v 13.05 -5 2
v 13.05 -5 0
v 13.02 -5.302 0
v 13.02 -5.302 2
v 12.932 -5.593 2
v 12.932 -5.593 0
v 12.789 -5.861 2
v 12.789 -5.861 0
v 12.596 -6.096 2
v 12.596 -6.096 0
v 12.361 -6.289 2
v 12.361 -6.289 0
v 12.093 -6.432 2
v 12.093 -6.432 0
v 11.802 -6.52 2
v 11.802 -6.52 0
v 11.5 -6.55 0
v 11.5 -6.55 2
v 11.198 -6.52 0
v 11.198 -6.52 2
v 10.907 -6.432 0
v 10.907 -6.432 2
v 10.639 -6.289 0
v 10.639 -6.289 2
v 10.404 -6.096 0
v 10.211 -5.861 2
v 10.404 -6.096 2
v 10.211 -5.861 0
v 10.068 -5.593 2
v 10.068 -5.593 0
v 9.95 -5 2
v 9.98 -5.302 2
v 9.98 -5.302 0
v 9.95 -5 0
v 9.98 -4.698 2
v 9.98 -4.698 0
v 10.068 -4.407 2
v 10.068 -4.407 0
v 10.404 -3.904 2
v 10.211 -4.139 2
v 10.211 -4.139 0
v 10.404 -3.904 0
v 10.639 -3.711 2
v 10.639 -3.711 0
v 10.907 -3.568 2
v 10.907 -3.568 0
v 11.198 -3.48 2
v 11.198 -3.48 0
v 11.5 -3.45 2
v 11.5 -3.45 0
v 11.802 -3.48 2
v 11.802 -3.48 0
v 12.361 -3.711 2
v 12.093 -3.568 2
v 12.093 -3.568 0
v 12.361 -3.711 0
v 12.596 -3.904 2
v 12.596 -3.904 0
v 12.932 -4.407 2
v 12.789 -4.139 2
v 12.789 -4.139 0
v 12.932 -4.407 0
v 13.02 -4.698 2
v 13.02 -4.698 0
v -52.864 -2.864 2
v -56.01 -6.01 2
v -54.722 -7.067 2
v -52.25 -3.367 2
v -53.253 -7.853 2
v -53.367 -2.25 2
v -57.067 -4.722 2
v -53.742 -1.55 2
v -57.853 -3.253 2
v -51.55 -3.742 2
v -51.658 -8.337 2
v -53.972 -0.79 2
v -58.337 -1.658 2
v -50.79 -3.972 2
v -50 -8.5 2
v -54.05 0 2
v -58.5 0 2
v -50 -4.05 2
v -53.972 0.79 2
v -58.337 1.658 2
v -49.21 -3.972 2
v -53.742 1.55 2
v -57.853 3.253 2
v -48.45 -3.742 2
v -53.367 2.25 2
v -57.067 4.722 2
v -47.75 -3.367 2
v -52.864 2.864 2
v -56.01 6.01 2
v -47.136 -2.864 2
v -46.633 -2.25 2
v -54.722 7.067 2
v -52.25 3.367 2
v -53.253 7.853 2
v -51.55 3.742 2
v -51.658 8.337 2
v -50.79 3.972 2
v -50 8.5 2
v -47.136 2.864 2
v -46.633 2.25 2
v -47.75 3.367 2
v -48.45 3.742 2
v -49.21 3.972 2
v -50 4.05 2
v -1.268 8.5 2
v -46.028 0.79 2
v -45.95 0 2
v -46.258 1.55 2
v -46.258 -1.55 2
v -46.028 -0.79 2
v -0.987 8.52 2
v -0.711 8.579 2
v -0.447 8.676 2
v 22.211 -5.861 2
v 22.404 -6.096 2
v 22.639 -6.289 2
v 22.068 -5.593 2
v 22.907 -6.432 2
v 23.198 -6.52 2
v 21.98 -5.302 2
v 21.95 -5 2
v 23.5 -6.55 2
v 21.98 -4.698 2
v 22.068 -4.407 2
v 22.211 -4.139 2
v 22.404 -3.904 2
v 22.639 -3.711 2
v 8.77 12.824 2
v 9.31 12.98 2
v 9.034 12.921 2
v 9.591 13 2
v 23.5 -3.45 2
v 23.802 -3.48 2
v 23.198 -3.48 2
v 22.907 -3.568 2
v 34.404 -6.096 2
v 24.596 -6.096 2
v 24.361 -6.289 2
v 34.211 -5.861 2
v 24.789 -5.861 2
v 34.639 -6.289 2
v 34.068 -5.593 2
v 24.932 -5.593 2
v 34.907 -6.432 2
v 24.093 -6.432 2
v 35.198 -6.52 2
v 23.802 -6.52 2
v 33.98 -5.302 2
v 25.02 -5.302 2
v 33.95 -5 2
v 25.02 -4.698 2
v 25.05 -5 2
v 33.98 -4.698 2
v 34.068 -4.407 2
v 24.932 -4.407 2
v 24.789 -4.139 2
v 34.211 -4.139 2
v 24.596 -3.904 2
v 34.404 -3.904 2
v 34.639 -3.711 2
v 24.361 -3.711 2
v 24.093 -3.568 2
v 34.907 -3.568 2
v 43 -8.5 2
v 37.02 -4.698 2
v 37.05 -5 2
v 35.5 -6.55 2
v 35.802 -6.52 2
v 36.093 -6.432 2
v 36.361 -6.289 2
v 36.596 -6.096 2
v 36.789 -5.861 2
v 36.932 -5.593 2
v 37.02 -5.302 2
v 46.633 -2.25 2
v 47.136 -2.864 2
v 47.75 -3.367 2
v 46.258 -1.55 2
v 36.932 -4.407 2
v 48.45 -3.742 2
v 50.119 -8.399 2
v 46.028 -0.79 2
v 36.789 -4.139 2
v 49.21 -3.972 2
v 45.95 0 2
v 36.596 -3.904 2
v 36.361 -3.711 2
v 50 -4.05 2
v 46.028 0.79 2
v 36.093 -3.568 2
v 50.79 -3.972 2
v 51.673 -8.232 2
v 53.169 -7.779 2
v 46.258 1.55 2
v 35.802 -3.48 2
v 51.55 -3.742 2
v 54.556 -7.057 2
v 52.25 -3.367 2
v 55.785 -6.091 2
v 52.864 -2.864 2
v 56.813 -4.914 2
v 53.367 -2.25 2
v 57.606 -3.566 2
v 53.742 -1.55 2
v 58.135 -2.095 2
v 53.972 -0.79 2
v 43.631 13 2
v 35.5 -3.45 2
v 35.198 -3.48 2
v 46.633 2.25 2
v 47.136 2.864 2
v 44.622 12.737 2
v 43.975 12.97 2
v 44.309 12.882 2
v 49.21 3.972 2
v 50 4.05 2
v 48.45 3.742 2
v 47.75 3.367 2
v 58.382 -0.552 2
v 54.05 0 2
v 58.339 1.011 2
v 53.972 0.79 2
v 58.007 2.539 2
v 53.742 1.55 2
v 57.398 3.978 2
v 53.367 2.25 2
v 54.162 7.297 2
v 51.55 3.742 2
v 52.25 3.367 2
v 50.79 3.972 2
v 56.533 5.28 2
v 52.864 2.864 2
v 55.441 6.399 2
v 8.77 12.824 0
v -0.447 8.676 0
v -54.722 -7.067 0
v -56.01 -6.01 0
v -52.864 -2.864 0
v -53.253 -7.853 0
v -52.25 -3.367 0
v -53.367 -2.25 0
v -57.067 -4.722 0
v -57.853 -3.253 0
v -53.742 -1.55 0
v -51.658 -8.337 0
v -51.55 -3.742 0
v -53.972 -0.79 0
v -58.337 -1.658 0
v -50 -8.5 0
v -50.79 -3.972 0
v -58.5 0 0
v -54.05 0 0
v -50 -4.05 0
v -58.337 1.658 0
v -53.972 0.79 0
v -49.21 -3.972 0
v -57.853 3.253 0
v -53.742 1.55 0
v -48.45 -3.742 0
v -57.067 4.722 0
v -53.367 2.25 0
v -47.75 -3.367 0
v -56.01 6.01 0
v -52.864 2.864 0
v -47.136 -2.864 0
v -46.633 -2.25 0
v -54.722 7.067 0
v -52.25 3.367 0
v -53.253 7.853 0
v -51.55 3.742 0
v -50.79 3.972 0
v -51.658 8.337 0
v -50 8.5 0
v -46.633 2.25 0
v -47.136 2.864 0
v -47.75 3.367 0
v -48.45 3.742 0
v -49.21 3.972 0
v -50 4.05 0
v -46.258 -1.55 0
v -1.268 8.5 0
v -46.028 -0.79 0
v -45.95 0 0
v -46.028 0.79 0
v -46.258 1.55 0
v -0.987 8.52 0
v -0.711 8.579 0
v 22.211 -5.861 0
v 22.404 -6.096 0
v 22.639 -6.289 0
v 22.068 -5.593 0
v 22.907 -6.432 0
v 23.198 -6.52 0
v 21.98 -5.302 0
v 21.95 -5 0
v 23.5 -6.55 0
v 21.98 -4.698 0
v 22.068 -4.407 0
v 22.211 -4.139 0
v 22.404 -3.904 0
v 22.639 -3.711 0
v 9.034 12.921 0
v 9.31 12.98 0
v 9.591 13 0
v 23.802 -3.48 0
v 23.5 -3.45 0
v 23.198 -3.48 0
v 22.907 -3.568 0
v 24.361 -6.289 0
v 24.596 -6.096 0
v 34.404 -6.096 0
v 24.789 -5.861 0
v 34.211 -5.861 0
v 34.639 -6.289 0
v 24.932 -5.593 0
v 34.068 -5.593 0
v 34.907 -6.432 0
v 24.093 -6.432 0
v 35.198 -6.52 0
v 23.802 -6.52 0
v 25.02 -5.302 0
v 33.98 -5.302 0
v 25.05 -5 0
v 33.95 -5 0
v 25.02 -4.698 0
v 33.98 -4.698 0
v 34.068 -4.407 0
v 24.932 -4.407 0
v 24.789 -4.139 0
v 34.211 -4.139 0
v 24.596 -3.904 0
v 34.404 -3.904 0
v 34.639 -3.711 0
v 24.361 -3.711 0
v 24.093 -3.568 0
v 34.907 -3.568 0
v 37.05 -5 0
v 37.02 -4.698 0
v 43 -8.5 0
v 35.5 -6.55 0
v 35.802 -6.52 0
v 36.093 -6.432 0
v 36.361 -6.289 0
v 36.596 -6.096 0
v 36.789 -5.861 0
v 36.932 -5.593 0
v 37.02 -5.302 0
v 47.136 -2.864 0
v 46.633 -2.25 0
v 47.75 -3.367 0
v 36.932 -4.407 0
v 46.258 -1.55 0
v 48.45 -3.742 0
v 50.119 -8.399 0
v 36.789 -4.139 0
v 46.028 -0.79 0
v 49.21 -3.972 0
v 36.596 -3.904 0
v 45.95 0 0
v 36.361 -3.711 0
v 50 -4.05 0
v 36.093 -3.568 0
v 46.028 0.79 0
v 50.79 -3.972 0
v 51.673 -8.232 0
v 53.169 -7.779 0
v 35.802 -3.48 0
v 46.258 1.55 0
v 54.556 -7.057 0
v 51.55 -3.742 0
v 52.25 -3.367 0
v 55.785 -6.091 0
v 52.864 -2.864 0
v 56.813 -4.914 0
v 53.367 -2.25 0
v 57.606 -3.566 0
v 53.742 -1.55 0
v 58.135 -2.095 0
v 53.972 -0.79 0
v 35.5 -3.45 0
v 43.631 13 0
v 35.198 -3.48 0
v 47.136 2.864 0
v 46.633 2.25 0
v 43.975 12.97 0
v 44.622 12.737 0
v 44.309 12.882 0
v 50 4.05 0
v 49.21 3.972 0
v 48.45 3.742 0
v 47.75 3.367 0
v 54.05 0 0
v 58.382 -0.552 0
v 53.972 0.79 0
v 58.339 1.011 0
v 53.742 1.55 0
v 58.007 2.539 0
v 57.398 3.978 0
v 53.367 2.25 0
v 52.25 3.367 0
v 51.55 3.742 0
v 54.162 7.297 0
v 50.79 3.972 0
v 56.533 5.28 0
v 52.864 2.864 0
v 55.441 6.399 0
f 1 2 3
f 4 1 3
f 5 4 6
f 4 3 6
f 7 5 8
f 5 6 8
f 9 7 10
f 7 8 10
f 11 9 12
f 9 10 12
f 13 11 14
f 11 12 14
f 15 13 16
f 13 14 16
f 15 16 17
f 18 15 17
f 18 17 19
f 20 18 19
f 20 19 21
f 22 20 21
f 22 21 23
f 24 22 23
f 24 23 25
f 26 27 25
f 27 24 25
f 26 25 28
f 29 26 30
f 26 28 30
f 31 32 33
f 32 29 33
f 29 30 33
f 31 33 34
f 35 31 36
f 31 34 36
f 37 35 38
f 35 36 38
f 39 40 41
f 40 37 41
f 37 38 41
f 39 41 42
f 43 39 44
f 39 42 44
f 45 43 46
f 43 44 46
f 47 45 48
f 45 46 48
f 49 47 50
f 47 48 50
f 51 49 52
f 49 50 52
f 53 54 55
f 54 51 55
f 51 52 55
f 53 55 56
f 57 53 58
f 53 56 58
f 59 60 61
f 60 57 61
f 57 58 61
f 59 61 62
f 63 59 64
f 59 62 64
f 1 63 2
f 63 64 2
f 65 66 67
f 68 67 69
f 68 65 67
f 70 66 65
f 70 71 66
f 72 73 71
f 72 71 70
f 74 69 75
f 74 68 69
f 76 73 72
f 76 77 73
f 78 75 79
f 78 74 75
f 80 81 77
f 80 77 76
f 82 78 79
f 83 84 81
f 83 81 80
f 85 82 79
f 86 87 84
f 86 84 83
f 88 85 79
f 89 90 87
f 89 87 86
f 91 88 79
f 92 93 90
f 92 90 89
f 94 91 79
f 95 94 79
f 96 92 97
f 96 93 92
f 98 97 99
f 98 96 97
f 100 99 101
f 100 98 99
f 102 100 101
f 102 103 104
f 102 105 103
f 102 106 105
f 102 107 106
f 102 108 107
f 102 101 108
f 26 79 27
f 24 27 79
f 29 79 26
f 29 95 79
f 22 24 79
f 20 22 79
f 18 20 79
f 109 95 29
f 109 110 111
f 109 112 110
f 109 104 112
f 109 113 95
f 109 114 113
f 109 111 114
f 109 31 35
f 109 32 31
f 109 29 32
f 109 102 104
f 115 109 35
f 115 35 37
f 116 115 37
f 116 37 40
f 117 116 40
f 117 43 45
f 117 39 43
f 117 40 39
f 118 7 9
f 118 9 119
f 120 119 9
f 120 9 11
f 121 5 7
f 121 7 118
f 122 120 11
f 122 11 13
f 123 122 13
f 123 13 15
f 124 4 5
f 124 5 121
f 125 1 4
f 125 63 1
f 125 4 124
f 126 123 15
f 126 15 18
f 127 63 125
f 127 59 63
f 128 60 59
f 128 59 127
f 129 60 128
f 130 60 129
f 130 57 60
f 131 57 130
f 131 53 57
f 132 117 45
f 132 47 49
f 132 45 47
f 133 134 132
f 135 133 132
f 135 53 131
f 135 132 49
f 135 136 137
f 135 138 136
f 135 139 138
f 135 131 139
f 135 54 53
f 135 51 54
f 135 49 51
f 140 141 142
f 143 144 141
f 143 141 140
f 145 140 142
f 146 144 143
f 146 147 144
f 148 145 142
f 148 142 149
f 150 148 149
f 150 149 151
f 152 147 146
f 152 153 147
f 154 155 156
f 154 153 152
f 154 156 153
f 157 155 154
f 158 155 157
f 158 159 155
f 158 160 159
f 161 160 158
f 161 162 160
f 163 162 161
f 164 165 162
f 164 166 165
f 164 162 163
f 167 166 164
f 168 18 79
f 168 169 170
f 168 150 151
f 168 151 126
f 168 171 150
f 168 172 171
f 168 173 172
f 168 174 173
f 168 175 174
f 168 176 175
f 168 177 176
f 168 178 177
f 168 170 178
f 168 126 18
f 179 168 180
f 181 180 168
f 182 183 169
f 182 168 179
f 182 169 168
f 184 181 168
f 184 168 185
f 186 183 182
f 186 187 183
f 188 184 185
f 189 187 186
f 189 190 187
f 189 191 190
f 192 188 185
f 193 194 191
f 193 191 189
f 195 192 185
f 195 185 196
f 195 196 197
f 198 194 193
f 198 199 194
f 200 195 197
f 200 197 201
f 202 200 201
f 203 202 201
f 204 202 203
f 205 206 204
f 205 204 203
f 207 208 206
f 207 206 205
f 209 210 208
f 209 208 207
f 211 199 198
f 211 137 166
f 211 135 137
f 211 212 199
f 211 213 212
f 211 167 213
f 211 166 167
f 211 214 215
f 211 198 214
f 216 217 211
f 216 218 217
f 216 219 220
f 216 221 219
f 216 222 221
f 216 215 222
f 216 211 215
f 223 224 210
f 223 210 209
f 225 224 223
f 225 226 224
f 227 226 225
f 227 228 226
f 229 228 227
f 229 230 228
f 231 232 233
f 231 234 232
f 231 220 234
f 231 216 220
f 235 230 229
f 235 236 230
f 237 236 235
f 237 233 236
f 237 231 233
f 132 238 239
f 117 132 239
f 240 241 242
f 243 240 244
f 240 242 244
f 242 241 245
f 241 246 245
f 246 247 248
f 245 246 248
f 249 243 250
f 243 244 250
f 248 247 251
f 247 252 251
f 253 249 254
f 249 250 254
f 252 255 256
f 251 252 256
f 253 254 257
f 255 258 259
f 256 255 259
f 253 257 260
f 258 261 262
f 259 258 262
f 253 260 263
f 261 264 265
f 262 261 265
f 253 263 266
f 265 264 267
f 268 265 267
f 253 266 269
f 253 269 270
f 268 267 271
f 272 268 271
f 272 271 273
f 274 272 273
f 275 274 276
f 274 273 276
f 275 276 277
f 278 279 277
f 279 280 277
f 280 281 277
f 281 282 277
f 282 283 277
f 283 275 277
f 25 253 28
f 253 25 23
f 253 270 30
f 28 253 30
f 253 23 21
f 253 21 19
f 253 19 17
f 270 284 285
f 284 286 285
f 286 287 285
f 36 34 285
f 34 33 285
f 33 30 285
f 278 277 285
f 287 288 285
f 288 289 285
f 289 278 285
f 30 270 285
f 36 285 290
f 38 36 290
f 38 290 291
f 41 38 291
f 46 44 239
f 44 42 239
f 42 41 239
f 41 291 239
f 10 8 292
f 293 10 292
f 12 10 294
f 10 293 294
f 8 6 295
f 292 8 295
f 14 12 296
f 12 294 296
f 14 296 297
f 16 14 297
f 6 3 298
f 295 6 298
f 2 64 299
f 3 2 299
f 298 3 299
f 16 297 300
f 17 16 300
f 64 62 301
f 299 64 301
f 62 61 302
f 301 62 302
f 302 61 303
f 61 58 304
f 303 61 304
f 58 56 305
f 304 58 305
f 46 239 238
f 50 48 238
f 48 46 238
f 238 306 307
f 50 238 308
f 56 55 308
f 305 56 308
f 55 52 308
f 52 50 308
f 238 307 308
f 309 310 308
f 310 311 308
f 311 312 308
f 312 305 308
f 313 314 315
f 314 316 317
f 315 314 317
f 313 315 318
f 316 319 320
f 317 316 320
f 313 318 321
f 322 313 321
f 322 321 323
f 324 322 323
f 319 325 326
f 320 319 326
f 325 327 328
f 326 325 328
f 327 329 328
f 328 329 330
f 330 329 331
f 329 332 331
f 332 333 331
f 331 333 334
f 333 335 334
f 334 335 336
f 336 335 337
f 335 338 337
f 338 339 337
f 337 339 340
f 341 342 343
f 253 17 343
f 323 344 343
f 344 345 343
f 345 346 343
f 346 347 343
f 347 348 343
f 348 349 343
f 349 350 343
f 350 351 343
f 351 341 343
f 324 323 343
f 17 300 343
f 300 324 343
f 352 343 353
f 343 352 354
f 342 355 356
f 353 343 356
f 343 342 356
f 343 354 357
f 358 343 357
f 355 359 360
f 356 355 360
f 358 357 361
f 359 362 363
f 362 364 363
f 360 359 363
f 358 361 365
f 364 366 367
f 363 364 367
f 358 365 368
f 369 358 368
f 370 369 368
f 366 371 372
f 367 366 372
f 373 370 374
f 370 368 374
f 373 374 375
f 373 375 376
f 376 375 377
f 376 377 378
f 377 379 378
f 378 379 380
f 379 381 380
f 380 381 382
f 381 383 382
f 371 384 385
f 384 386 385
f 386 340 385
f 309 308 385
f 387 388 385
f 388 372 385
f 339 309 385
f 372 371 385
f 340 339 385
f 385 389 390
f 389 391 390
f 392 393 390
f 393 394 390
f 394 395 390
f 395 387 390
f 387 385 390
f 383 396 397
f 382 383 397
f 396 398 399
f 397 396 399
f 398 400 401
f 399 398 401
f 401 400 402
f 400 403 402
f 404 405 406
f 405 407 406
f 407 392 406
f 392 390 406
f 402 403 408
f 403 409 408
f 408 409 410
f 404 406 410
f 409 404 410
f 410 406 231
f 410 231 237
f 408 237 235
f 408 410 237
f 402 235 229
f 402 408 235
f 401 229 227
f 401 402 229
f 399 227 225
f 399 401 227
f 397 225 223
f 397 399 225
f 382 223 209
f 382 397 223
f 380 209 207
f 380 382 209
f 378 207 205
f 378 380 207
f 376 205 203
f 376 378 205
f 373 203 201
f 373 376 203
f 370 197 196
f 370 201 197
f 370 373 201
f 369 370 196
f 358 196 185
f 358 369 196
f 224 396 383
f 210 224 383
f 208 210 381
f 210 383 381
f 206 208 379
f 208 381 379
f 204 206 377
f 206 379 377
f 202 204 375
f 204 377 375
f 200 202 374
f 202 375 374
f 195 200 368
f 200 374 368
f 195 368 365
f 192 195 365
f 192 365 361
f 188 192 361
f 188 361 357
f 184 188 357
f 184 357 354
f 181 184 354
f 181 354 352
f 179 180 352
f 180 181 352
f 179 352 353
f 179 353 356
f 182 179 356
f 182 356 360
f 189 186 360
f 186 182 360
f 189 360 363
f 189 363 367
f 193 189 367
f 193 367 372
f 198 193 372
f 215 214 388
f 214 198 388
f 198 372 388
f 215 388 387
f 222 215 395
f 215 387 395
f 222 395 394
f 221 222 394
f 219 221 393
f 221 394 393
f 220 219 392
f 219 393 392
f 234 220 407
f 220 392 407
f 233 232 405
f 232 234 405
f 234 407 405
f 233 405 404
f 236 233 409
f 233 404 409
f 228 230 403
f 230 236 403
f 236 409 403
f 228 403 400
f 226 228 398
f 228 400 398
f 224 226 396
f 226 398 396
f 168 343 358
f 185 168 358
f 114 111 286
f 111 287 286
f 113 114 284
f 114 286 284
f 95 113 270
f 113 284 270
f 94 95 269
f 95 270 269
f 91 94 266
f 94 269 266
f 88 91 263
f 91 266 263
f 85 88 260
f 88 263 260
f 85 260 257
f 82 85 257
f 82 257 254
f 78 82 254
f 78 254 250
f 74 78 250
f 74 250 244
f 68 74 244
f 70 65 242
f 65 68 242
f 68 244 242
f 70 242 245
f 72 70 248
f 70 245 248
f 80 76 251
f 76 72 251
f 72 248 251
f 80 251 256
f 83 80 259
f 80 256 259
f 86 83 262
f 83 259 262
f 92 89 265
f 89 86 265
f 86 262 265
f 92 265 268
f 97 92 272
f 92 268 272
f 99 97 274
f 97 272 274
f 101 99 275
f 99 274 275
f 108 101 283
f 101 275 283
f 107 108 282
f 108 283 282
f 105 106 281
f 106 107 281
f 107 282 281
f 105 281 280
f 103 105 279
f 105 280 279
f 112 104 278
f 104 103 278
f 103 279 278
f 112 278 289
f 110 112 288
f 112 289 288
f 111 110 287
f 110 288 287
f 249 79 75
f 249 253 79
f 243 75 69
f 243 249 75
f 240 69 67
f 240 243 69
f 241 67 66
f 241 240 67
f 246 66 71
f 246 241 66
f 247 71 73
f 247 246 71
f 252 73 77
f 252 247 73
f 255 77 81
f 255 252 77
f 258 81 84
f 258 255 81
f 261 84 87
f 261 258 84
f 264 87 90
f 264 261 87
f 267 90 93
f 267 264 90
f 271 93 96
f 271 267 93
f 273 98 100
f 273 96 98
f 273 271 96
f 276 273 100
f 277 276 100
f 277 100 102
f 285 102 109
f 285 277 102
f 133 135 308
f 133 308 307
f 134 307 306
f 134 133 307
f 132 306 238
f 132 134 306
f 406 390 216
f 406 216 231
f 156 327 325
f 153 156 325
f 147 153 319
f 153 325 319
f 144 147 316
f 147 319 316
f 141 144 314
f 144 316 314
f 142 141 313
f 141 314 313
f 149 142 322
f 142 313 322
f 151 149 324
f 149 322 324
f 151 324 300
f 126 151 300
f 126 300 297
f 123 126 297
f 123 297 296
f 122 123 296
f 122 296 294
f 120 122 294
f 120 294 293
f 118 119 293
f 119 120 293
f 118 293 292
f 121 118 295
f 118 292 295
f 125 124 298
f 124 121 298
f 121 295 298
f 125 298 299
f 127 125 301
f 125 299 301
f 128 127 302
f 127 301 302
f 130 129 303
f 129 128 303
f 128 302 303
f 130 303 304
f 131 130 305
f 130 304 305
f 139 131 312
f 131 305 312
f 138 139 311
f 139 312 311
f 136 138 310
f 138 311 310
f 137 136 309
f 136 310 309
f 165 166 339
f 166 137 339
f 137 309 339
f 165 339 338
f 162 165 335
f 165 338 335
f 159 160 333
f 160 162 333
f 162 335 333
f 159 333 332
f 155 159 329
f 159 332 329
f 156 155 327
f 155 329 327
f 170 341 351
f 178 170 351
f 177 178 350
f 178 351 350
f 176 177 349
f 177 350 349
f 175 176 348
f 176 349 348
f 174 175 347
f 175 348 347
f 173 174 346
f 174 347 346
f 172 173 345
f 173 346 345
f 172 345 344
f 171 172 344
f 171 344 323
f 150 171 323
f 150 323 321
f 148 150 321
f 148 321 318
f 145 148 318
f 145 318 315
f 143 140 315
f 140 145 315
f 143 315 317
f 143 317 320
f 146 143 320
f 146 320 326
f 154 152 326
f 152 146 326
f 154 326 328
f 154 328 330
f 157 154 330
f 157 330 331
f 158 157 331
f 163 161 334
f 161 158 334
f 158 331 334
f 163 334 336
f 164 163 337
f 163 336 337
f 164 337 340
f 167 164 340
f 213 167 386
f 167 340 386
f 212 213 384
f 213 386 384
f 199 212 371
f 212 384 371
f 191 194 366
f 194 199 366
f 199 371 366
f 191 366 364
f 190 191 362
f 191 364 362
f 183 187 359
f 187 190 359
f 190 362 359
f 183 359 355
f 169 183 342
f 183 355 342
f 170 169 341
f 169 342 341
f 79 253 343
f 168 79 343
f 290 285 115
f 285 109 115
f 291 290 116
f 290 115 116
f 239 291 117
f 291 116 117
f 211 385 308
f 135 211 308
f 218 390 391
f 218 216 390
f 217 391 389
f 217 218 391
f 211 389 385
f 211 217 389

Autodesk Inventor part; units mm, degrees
ref_plane "YZ Plane" through (0, 0, 0) normal (1, 0, 0) x (0, 1, 0)
ref_plane "XZ Plane" through (0, 0, 0) normal (0, 1, 0) x (-1, 0, 0)
ref_plane "XY Plane" through (0, 0, 0) normal (0, 0, 1) x (1, 0, 0)
sketch "スケッチ1" plane through (0, 0, 0) normal (0, 0, 1) x (1, 0, 0)
  line L0 (-50, 0) -> (50, 0) construction
  circle A0 centre (-50, 0) radius 4.05
  circle A1 centre (50, 0) radius 4.05
  line L1 (-50, 8.5) -> (43, 8.5)
  line L2 (-50, -8.5) -> (43, -8.5)
  arc A2 (-50, 8.5) -> (-50, -8.5) centre (-50, 0) ccw
  line L3 (43, -8.5) -> (50.119, -8.3992)
  line L4 (43, 8.5) -> (50.119, 8.3992)
  arc A3 (50.119, -8.3992) -> (50.119, 8.3992) centre (50, 0) ccw
  line L5 (9, -7.5) -> (38, -7.5) construction
  line L6 (38, -7.5) -> (38, -2.5) construction
  line L7 (38, -2.5) -> (9, -2.5) construction
  line L8 (9, -2.5) -> (9, -7.5) construction
  line L9 (9, -5) -> (38, -5) construction
  circle A4 centre (23.5, -5) radius 1.55
  circle A5 centre (11.5, -5) radius 1.55
  circle A6 centre (35.5, -5) radius 1.55
  line L10 (23.5, -5) -> (23.5, -2.5) construction
  line L11 (44.1615, 13) -> (9.1615, 13)
  line L12 (9.1615, 13) -> (-0.8385, 8.5)
  line L13 (44.1615, 13) -> (54.1615, 7.2967)
  point P0 (0, 0)
  point P1 (0, 0)
  point P2 (52.0517, 8.5)
  dimension "d0" = 100
  dimension "d1" = 8.1
  dimension "d2" = 8.5
  dimension "d8" = 8.1
  dimension "d9" = 7
  dimension "d10" = 8.4
  dimension "d12" = 5
  dimension "d13" = 29
  dimension "d14" = 3.1
  dimension "d15" = 2.5
  dimension "d17" = 13
  dimension "d19" = 10
  dimension "d20" = 35
  dimension "d25" = 12
  dimension "d26" = 10
  dimension "d34" = 1
extrude "押し出し1" add sketch "スケッチ1" along normal blind 2
fillet "フィレット1" radius 2 3 edges at (-0.8385, 8.5, 1) (9.1615, 13, 1) (44.1615, 13, 1)
equation "\"d8\" = d1"
equation "\"d19\" = d18"
equation "\"d26\" = d19"
equation "\"d18\" = 10"
properties part number "リンク_メインフレーム_6_3" material "GFRP"
